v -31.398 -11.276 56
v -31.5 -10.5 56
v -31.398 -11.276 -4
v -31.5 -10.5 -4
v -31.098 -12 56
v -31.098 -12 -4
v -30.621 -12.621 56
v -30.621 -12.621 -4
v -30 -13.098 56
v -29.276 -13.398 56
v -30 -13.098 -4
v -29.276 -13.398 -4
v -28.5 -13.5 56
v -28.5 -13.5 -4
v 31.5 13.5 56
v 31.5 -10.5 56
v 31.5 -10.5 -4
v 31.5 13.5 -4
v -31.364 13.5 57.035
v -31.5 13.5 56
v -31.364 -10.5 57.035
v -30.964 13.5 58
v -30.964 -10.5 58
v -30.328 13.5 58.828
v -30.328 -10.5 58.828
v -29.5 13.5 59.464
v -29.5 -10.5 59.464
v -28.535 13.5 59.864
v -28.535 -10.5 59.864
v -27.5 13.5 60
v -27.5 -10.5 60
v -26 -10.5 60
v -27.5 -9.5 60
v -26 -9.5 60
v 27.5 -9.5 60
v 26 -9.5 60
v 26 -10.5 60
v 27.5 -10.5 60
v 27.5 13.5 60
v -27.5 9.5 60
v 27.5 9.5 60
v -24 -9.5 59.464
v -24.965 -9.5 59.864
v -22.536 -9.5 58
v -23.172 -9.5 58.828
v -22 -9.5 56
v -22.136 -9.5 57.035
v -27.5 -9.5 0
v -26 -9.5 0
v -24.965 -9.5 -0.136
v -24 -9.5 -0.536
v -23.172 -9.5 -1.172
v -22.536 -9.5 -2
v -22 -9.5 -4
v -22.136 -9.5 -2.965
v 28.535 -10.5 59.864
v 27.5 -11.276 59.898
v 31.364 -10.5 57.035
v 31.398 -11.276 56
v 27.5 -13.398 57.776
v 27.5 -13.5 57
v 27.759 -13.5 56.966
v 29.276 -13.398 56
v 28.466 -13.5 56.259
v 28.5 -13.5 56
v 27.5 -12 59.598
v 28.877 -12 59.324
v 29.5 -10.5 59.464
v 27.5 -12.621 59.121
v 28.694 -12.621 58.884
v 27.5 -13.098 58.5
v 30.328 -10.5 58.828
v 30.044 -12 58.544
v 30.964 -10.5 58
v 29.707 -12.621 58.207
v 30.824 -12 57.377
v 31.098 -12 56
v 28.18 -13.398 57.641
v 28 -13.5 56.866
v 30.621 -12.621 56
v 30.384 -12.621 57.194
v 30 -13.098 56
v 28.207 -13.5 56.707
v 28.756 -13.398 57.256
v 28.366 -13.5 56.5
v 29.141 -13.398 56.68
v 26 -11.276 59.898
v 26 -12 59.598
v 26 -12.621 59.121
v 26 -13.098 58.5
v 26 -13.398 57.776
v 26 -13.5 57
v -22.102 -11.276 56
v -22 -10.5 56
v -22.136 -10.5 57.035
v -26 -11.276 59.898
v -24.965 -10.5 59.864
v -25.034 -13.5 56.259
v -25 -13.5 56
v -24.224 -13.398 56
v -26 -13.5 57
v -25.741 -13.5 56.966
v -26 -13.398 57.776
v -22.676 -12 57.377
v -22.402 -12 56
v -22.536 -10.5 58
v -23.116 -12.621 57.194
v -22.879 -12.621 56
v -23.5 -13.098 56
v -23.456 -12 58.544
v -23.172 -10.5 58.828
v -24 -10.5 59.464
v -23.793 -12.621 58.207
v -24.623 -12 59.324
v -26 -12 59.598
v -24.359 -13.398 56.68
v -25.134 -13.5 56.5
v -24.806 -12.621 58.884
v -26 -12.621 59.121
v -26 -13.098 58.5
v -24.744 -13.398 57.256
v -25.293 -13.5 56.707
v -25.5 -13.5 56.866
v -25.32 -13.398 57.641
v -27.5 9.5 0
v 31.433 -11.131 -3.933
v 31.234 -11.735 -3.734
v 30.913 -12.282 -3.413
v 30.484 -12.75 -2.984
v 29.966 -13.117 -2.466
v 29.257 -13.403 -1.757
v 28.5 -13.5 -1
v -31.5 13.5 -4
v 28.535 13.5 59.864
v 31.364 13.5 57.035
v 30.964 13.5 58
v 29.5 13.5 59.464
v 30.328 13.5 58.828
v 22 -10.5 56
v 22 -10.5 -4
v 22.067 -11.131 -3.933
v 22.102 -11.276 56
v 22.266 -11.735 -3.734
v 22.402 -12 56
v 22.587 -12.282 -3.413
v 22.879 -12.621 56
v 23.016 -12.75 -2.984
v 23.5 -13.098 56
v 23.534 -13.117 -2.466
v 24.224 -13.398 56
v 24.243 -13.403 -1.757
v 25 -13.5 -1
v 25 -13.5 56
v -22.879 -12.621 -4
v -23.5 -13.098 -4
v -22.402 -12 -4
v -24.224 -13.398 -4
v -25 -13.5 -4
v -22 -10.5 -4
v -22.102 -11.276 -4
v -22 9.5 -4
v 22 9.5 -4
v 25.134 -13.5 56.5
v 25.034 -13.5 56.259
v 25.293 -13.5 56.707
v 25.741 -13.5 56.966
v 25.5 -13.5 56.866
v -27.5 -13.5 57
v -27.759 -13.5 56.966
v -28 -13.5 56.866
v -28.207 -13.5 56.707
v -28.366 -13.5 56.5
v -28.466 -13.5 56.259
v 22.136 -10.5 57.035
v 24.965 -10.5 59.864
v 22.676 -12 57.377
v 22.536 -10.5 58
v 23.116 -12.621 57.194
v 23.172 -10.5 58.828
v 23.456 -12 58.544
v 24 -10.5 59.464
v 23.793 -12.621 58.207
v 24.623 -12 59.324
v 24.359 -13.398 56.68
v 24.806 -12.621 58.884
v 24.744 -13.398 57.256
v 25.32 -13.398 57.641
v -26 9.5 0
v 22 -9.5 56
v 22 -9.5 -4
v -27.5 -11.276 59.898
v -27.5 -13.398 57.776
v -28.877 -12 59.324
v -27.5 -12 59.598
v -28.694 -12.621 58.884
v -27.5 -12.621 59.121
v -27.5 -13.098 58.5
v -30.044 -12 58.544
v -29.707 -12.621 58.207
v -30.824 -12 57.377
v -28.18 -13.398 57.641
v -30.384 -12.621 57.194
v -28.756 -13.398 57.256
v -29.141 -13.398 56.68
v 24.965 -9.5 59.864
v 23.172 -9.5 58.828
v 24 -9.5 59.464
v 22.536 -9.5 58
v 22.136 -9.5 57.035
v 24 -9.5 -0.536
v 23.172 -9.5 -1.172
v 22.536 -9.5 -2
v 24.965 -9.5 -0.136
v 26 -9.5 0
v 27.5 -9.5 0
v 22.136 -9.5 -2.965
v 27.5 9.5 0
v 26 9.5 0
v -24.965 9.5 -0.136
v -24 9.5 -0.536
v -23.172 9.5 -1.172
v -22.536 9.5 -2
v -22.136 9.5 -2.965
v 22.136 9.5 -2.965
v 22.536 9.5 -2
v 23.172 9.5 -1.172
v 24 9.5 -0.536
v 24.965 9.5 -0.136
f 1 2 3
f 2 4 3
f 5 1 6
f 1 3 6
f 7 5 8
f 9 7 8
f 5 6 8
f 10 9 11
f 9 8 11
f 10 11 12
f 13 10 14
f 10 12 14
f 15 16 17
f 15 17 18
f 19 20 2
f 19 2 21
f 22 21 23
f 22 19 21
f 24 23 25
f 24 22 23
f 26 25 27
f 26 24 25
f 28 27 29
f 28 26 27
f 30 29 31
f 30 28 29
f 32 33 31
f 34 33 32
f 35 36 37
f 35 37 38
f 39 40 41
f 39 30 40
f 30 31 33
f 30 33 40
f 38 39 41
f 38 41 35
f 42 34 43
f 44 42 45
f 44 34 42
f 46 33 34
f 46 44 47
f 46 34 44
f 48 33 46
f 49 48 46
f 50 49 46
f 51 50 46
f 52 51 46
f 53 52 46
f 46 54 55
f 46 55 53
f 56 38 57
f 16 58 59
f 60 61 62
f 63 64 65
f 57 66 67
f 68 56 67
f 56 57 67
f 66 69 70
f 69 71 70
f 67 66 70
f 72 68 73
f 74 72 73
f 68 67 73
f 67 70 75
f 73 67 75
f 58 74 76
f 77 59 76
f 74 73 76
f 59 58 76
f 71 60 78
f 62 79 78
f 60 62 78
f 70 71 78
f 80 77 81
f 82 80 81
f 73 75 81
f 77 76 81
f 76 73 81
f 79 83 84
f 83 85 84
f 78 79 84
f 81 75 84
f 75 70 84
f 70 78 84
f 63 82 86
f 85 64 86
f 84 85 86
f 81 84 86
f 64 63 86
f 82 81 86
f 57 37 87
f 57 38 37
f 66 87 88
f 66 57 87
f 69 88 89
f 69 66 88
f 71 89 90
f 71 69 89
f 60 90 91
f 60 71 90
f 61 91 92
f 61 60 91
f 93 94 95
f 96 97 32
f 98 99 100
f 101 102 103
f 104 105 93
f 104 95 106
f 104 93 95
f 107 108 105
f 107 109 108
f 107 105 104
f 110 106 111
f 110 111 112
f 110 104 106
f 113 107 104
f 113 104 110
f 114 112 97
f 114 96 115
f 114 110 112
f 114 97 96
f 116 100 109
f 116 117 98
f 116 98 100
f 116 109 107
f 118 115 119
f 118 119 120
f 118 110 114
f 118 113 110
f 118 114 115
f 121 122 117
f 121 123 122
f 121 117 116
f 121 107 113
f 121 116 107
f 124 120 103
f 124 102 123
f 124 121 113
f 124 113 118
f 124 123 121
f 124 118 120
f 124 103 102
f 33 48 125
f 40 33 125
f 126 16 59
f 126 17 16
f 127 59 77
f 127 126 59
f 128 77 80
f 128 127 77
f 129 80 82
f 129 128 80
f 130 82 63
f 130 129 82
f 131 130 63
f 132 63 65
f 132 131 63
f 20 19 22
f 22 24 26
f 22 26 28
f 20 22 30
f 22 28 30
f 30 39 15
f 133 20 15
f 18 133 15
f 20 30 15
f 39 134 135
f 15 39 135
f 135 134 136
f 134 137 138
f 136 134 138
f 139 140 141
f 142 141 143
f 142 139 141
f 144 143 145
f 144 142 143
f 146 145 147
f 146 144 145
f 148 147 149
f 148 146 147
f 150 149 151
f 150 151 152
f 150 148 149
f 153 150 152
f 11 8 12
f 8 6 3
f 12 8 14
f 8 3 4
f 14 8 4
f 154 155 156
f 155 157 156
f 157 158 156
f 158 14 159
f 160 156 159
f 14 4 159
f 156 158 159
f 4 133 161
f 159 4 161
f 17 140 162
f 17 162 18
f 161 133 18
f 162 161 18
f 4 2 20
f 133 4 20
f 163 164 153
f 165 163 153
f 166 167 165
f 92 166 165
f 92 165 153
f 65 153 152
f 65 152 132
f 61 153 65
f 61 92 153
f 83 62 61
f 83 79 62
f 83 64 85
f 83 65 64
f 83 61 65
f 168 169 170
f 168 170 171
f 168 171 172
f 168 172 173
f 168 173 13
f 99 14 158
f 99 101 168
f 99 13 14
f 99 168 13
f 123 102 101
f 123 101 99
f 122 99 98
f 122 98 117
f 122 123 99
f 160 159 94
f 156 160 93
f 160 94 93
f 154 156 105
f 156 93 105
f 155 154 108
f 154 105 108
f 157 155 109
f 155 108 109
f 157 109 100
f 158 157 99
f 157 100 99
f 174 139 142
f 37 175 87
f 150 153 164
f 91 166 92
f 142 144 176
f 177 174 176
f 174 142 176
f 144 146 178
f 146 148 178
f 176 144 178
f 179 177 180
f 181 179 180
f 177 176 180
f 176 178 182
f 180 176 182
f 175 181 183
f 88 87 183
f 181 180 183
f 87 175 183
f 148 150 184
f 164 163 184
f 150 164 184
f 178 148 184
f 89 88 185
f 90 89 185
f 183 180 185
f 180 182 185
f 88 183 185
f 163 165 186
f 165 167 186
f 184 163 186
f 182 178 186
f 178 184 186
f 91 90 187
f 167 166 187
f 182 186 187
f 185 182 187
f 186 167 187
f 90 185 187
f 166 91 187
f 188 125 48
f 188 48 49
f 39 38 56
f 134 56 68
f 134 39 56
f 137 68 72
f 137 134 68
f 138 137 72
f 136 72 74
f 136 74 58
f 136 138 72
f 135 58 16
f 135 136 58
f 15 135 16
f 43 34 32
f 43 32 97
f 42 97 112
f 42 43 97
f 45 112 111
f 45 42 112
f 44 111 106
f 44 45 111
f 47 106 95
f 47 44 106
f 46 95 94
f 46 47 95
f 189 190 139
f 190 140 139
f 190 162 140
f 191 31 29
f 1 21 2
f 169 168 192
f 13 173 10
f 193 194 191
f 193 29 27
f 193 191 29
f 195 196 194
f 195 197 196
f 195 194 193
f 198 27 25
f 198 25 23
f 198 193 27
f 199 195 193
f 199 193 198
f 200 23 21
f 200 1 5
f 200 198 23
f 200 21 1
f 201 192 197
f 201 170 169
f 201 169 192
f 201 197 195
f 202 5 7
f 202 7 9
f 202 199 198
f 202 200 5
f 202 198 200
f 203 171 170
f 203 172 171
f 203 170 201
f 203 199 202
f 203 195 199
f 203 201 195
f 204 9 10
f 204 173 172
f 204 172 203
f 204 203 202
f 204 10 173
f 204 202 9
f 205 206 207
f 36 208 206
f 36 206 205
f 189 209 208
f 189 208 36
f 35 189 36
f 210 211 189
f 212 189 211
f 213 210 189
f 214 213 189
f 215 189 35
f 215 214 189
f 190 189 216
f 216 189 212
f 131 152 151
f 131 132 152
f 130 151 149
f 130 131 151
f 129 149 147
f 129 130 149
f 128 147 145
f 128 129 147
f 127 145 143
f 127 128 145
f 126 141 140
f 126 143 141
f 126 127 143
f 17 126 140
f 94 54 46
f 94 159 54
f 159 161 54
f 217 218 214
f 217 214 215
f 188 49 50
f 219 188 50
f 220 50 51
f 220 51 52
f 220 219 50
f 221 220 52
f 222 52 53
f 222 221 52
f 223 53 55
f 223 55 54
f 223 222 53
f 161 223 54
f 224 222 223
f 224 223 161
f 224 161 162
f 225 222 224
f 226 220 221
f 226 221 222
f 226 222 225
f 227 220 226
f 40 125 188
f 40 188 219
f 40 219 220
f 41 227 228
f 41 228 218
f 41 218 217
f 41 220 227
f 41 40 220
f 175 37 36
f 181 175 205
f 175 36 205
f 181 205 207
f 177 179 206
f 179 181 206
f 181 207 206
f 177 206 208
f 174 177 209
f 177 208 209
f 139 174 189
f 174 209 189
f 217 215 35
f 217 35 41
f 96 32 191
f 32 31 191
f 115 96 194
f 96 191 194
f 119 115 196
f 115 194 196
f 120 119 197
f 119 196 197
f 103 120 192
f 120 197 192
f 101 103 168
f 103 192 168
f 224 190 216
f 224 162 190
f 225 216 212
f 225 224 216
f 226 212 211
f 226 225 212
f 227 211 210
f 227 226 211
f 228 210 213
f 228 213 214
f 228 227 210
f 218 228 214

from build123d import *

# Parameters (mm, degrees)
F0_W     = 63
F0_H     = 27
F0_W_2   = 55
F0_H_2   = 19
F1_DEPTH = 60
F2_DEPTH = 4
F3_W     = 44
F3_H     = 64
F4_DEPTH = 23
F5_R     = 3.99999
F6_R     = 3


# Not quite as in the source:
# - a fillet or chamfer is up to 0.001 mm smaller than in the source, because OpenCascade refuses the exact size


with BuildPart() as f1:
    # F0 (on Top) → F1 (new body)
    with BuildSketch(Plane.XY):
        Rectangle(F0_W, F0_H)
        Rectangle(F0_W_2, F0_H_2, mode=Mode.SUBTRACT)
    extrude(amount=F1_DEPTH)

    # F0 (on Top) → F2 (join)
    with BuildSketch(Plane.XY):
        Rectangle(F0_W, F0_H)
        Rectangle(F0_W_2, F0_H_2, mode=Mode.SUBTRACT)
        Rectangle(F0_W_2, F0_H_2)
    extrude(amount=-F2_DEPTH)

    # F3 (on face) → F4 (cut)
    with BuildSketch(Plane.XZ.offset(13.5)):
        with Locations((0, 28)):
            Rectangle(F3_W, F3_H)
    extrude(amount=-F4_DEPTH, mode=Mode.SUBTRACT)

    # F5 (radius 4 in the source; OpenCascade refuses exactly that, so slightly less here)
    f5_edges = [f1.edges().sort_by_distance(p)[0] for p in [
        (-22, -11.5, 60),
        (-22, 0, 0),
        (22, 0, 0),
        (-31.5, 0, 60),
        (31.5, 0, 60),
        (22, -11.5, 60),
    ]]
    fillet(f5_edges, radius=F5_R)

    # F6
    f6_edges = [f1.edges().sort_by_distance(p)[0] for p in [
        (-22, -13.5, 26.000005),
        (22, -13.5, 26.000005),
        (23.17157, -13.5, 58.82843),
        (26.75, -13.5, -4),
        (26.75, -13.5, 60),
        (31.5, -13.5, 26.000005),
        (30.32843, -13.5, 58.82843),
    ]]
    fillet(f6_edges, radius=F6_R)


solid = f1.part
